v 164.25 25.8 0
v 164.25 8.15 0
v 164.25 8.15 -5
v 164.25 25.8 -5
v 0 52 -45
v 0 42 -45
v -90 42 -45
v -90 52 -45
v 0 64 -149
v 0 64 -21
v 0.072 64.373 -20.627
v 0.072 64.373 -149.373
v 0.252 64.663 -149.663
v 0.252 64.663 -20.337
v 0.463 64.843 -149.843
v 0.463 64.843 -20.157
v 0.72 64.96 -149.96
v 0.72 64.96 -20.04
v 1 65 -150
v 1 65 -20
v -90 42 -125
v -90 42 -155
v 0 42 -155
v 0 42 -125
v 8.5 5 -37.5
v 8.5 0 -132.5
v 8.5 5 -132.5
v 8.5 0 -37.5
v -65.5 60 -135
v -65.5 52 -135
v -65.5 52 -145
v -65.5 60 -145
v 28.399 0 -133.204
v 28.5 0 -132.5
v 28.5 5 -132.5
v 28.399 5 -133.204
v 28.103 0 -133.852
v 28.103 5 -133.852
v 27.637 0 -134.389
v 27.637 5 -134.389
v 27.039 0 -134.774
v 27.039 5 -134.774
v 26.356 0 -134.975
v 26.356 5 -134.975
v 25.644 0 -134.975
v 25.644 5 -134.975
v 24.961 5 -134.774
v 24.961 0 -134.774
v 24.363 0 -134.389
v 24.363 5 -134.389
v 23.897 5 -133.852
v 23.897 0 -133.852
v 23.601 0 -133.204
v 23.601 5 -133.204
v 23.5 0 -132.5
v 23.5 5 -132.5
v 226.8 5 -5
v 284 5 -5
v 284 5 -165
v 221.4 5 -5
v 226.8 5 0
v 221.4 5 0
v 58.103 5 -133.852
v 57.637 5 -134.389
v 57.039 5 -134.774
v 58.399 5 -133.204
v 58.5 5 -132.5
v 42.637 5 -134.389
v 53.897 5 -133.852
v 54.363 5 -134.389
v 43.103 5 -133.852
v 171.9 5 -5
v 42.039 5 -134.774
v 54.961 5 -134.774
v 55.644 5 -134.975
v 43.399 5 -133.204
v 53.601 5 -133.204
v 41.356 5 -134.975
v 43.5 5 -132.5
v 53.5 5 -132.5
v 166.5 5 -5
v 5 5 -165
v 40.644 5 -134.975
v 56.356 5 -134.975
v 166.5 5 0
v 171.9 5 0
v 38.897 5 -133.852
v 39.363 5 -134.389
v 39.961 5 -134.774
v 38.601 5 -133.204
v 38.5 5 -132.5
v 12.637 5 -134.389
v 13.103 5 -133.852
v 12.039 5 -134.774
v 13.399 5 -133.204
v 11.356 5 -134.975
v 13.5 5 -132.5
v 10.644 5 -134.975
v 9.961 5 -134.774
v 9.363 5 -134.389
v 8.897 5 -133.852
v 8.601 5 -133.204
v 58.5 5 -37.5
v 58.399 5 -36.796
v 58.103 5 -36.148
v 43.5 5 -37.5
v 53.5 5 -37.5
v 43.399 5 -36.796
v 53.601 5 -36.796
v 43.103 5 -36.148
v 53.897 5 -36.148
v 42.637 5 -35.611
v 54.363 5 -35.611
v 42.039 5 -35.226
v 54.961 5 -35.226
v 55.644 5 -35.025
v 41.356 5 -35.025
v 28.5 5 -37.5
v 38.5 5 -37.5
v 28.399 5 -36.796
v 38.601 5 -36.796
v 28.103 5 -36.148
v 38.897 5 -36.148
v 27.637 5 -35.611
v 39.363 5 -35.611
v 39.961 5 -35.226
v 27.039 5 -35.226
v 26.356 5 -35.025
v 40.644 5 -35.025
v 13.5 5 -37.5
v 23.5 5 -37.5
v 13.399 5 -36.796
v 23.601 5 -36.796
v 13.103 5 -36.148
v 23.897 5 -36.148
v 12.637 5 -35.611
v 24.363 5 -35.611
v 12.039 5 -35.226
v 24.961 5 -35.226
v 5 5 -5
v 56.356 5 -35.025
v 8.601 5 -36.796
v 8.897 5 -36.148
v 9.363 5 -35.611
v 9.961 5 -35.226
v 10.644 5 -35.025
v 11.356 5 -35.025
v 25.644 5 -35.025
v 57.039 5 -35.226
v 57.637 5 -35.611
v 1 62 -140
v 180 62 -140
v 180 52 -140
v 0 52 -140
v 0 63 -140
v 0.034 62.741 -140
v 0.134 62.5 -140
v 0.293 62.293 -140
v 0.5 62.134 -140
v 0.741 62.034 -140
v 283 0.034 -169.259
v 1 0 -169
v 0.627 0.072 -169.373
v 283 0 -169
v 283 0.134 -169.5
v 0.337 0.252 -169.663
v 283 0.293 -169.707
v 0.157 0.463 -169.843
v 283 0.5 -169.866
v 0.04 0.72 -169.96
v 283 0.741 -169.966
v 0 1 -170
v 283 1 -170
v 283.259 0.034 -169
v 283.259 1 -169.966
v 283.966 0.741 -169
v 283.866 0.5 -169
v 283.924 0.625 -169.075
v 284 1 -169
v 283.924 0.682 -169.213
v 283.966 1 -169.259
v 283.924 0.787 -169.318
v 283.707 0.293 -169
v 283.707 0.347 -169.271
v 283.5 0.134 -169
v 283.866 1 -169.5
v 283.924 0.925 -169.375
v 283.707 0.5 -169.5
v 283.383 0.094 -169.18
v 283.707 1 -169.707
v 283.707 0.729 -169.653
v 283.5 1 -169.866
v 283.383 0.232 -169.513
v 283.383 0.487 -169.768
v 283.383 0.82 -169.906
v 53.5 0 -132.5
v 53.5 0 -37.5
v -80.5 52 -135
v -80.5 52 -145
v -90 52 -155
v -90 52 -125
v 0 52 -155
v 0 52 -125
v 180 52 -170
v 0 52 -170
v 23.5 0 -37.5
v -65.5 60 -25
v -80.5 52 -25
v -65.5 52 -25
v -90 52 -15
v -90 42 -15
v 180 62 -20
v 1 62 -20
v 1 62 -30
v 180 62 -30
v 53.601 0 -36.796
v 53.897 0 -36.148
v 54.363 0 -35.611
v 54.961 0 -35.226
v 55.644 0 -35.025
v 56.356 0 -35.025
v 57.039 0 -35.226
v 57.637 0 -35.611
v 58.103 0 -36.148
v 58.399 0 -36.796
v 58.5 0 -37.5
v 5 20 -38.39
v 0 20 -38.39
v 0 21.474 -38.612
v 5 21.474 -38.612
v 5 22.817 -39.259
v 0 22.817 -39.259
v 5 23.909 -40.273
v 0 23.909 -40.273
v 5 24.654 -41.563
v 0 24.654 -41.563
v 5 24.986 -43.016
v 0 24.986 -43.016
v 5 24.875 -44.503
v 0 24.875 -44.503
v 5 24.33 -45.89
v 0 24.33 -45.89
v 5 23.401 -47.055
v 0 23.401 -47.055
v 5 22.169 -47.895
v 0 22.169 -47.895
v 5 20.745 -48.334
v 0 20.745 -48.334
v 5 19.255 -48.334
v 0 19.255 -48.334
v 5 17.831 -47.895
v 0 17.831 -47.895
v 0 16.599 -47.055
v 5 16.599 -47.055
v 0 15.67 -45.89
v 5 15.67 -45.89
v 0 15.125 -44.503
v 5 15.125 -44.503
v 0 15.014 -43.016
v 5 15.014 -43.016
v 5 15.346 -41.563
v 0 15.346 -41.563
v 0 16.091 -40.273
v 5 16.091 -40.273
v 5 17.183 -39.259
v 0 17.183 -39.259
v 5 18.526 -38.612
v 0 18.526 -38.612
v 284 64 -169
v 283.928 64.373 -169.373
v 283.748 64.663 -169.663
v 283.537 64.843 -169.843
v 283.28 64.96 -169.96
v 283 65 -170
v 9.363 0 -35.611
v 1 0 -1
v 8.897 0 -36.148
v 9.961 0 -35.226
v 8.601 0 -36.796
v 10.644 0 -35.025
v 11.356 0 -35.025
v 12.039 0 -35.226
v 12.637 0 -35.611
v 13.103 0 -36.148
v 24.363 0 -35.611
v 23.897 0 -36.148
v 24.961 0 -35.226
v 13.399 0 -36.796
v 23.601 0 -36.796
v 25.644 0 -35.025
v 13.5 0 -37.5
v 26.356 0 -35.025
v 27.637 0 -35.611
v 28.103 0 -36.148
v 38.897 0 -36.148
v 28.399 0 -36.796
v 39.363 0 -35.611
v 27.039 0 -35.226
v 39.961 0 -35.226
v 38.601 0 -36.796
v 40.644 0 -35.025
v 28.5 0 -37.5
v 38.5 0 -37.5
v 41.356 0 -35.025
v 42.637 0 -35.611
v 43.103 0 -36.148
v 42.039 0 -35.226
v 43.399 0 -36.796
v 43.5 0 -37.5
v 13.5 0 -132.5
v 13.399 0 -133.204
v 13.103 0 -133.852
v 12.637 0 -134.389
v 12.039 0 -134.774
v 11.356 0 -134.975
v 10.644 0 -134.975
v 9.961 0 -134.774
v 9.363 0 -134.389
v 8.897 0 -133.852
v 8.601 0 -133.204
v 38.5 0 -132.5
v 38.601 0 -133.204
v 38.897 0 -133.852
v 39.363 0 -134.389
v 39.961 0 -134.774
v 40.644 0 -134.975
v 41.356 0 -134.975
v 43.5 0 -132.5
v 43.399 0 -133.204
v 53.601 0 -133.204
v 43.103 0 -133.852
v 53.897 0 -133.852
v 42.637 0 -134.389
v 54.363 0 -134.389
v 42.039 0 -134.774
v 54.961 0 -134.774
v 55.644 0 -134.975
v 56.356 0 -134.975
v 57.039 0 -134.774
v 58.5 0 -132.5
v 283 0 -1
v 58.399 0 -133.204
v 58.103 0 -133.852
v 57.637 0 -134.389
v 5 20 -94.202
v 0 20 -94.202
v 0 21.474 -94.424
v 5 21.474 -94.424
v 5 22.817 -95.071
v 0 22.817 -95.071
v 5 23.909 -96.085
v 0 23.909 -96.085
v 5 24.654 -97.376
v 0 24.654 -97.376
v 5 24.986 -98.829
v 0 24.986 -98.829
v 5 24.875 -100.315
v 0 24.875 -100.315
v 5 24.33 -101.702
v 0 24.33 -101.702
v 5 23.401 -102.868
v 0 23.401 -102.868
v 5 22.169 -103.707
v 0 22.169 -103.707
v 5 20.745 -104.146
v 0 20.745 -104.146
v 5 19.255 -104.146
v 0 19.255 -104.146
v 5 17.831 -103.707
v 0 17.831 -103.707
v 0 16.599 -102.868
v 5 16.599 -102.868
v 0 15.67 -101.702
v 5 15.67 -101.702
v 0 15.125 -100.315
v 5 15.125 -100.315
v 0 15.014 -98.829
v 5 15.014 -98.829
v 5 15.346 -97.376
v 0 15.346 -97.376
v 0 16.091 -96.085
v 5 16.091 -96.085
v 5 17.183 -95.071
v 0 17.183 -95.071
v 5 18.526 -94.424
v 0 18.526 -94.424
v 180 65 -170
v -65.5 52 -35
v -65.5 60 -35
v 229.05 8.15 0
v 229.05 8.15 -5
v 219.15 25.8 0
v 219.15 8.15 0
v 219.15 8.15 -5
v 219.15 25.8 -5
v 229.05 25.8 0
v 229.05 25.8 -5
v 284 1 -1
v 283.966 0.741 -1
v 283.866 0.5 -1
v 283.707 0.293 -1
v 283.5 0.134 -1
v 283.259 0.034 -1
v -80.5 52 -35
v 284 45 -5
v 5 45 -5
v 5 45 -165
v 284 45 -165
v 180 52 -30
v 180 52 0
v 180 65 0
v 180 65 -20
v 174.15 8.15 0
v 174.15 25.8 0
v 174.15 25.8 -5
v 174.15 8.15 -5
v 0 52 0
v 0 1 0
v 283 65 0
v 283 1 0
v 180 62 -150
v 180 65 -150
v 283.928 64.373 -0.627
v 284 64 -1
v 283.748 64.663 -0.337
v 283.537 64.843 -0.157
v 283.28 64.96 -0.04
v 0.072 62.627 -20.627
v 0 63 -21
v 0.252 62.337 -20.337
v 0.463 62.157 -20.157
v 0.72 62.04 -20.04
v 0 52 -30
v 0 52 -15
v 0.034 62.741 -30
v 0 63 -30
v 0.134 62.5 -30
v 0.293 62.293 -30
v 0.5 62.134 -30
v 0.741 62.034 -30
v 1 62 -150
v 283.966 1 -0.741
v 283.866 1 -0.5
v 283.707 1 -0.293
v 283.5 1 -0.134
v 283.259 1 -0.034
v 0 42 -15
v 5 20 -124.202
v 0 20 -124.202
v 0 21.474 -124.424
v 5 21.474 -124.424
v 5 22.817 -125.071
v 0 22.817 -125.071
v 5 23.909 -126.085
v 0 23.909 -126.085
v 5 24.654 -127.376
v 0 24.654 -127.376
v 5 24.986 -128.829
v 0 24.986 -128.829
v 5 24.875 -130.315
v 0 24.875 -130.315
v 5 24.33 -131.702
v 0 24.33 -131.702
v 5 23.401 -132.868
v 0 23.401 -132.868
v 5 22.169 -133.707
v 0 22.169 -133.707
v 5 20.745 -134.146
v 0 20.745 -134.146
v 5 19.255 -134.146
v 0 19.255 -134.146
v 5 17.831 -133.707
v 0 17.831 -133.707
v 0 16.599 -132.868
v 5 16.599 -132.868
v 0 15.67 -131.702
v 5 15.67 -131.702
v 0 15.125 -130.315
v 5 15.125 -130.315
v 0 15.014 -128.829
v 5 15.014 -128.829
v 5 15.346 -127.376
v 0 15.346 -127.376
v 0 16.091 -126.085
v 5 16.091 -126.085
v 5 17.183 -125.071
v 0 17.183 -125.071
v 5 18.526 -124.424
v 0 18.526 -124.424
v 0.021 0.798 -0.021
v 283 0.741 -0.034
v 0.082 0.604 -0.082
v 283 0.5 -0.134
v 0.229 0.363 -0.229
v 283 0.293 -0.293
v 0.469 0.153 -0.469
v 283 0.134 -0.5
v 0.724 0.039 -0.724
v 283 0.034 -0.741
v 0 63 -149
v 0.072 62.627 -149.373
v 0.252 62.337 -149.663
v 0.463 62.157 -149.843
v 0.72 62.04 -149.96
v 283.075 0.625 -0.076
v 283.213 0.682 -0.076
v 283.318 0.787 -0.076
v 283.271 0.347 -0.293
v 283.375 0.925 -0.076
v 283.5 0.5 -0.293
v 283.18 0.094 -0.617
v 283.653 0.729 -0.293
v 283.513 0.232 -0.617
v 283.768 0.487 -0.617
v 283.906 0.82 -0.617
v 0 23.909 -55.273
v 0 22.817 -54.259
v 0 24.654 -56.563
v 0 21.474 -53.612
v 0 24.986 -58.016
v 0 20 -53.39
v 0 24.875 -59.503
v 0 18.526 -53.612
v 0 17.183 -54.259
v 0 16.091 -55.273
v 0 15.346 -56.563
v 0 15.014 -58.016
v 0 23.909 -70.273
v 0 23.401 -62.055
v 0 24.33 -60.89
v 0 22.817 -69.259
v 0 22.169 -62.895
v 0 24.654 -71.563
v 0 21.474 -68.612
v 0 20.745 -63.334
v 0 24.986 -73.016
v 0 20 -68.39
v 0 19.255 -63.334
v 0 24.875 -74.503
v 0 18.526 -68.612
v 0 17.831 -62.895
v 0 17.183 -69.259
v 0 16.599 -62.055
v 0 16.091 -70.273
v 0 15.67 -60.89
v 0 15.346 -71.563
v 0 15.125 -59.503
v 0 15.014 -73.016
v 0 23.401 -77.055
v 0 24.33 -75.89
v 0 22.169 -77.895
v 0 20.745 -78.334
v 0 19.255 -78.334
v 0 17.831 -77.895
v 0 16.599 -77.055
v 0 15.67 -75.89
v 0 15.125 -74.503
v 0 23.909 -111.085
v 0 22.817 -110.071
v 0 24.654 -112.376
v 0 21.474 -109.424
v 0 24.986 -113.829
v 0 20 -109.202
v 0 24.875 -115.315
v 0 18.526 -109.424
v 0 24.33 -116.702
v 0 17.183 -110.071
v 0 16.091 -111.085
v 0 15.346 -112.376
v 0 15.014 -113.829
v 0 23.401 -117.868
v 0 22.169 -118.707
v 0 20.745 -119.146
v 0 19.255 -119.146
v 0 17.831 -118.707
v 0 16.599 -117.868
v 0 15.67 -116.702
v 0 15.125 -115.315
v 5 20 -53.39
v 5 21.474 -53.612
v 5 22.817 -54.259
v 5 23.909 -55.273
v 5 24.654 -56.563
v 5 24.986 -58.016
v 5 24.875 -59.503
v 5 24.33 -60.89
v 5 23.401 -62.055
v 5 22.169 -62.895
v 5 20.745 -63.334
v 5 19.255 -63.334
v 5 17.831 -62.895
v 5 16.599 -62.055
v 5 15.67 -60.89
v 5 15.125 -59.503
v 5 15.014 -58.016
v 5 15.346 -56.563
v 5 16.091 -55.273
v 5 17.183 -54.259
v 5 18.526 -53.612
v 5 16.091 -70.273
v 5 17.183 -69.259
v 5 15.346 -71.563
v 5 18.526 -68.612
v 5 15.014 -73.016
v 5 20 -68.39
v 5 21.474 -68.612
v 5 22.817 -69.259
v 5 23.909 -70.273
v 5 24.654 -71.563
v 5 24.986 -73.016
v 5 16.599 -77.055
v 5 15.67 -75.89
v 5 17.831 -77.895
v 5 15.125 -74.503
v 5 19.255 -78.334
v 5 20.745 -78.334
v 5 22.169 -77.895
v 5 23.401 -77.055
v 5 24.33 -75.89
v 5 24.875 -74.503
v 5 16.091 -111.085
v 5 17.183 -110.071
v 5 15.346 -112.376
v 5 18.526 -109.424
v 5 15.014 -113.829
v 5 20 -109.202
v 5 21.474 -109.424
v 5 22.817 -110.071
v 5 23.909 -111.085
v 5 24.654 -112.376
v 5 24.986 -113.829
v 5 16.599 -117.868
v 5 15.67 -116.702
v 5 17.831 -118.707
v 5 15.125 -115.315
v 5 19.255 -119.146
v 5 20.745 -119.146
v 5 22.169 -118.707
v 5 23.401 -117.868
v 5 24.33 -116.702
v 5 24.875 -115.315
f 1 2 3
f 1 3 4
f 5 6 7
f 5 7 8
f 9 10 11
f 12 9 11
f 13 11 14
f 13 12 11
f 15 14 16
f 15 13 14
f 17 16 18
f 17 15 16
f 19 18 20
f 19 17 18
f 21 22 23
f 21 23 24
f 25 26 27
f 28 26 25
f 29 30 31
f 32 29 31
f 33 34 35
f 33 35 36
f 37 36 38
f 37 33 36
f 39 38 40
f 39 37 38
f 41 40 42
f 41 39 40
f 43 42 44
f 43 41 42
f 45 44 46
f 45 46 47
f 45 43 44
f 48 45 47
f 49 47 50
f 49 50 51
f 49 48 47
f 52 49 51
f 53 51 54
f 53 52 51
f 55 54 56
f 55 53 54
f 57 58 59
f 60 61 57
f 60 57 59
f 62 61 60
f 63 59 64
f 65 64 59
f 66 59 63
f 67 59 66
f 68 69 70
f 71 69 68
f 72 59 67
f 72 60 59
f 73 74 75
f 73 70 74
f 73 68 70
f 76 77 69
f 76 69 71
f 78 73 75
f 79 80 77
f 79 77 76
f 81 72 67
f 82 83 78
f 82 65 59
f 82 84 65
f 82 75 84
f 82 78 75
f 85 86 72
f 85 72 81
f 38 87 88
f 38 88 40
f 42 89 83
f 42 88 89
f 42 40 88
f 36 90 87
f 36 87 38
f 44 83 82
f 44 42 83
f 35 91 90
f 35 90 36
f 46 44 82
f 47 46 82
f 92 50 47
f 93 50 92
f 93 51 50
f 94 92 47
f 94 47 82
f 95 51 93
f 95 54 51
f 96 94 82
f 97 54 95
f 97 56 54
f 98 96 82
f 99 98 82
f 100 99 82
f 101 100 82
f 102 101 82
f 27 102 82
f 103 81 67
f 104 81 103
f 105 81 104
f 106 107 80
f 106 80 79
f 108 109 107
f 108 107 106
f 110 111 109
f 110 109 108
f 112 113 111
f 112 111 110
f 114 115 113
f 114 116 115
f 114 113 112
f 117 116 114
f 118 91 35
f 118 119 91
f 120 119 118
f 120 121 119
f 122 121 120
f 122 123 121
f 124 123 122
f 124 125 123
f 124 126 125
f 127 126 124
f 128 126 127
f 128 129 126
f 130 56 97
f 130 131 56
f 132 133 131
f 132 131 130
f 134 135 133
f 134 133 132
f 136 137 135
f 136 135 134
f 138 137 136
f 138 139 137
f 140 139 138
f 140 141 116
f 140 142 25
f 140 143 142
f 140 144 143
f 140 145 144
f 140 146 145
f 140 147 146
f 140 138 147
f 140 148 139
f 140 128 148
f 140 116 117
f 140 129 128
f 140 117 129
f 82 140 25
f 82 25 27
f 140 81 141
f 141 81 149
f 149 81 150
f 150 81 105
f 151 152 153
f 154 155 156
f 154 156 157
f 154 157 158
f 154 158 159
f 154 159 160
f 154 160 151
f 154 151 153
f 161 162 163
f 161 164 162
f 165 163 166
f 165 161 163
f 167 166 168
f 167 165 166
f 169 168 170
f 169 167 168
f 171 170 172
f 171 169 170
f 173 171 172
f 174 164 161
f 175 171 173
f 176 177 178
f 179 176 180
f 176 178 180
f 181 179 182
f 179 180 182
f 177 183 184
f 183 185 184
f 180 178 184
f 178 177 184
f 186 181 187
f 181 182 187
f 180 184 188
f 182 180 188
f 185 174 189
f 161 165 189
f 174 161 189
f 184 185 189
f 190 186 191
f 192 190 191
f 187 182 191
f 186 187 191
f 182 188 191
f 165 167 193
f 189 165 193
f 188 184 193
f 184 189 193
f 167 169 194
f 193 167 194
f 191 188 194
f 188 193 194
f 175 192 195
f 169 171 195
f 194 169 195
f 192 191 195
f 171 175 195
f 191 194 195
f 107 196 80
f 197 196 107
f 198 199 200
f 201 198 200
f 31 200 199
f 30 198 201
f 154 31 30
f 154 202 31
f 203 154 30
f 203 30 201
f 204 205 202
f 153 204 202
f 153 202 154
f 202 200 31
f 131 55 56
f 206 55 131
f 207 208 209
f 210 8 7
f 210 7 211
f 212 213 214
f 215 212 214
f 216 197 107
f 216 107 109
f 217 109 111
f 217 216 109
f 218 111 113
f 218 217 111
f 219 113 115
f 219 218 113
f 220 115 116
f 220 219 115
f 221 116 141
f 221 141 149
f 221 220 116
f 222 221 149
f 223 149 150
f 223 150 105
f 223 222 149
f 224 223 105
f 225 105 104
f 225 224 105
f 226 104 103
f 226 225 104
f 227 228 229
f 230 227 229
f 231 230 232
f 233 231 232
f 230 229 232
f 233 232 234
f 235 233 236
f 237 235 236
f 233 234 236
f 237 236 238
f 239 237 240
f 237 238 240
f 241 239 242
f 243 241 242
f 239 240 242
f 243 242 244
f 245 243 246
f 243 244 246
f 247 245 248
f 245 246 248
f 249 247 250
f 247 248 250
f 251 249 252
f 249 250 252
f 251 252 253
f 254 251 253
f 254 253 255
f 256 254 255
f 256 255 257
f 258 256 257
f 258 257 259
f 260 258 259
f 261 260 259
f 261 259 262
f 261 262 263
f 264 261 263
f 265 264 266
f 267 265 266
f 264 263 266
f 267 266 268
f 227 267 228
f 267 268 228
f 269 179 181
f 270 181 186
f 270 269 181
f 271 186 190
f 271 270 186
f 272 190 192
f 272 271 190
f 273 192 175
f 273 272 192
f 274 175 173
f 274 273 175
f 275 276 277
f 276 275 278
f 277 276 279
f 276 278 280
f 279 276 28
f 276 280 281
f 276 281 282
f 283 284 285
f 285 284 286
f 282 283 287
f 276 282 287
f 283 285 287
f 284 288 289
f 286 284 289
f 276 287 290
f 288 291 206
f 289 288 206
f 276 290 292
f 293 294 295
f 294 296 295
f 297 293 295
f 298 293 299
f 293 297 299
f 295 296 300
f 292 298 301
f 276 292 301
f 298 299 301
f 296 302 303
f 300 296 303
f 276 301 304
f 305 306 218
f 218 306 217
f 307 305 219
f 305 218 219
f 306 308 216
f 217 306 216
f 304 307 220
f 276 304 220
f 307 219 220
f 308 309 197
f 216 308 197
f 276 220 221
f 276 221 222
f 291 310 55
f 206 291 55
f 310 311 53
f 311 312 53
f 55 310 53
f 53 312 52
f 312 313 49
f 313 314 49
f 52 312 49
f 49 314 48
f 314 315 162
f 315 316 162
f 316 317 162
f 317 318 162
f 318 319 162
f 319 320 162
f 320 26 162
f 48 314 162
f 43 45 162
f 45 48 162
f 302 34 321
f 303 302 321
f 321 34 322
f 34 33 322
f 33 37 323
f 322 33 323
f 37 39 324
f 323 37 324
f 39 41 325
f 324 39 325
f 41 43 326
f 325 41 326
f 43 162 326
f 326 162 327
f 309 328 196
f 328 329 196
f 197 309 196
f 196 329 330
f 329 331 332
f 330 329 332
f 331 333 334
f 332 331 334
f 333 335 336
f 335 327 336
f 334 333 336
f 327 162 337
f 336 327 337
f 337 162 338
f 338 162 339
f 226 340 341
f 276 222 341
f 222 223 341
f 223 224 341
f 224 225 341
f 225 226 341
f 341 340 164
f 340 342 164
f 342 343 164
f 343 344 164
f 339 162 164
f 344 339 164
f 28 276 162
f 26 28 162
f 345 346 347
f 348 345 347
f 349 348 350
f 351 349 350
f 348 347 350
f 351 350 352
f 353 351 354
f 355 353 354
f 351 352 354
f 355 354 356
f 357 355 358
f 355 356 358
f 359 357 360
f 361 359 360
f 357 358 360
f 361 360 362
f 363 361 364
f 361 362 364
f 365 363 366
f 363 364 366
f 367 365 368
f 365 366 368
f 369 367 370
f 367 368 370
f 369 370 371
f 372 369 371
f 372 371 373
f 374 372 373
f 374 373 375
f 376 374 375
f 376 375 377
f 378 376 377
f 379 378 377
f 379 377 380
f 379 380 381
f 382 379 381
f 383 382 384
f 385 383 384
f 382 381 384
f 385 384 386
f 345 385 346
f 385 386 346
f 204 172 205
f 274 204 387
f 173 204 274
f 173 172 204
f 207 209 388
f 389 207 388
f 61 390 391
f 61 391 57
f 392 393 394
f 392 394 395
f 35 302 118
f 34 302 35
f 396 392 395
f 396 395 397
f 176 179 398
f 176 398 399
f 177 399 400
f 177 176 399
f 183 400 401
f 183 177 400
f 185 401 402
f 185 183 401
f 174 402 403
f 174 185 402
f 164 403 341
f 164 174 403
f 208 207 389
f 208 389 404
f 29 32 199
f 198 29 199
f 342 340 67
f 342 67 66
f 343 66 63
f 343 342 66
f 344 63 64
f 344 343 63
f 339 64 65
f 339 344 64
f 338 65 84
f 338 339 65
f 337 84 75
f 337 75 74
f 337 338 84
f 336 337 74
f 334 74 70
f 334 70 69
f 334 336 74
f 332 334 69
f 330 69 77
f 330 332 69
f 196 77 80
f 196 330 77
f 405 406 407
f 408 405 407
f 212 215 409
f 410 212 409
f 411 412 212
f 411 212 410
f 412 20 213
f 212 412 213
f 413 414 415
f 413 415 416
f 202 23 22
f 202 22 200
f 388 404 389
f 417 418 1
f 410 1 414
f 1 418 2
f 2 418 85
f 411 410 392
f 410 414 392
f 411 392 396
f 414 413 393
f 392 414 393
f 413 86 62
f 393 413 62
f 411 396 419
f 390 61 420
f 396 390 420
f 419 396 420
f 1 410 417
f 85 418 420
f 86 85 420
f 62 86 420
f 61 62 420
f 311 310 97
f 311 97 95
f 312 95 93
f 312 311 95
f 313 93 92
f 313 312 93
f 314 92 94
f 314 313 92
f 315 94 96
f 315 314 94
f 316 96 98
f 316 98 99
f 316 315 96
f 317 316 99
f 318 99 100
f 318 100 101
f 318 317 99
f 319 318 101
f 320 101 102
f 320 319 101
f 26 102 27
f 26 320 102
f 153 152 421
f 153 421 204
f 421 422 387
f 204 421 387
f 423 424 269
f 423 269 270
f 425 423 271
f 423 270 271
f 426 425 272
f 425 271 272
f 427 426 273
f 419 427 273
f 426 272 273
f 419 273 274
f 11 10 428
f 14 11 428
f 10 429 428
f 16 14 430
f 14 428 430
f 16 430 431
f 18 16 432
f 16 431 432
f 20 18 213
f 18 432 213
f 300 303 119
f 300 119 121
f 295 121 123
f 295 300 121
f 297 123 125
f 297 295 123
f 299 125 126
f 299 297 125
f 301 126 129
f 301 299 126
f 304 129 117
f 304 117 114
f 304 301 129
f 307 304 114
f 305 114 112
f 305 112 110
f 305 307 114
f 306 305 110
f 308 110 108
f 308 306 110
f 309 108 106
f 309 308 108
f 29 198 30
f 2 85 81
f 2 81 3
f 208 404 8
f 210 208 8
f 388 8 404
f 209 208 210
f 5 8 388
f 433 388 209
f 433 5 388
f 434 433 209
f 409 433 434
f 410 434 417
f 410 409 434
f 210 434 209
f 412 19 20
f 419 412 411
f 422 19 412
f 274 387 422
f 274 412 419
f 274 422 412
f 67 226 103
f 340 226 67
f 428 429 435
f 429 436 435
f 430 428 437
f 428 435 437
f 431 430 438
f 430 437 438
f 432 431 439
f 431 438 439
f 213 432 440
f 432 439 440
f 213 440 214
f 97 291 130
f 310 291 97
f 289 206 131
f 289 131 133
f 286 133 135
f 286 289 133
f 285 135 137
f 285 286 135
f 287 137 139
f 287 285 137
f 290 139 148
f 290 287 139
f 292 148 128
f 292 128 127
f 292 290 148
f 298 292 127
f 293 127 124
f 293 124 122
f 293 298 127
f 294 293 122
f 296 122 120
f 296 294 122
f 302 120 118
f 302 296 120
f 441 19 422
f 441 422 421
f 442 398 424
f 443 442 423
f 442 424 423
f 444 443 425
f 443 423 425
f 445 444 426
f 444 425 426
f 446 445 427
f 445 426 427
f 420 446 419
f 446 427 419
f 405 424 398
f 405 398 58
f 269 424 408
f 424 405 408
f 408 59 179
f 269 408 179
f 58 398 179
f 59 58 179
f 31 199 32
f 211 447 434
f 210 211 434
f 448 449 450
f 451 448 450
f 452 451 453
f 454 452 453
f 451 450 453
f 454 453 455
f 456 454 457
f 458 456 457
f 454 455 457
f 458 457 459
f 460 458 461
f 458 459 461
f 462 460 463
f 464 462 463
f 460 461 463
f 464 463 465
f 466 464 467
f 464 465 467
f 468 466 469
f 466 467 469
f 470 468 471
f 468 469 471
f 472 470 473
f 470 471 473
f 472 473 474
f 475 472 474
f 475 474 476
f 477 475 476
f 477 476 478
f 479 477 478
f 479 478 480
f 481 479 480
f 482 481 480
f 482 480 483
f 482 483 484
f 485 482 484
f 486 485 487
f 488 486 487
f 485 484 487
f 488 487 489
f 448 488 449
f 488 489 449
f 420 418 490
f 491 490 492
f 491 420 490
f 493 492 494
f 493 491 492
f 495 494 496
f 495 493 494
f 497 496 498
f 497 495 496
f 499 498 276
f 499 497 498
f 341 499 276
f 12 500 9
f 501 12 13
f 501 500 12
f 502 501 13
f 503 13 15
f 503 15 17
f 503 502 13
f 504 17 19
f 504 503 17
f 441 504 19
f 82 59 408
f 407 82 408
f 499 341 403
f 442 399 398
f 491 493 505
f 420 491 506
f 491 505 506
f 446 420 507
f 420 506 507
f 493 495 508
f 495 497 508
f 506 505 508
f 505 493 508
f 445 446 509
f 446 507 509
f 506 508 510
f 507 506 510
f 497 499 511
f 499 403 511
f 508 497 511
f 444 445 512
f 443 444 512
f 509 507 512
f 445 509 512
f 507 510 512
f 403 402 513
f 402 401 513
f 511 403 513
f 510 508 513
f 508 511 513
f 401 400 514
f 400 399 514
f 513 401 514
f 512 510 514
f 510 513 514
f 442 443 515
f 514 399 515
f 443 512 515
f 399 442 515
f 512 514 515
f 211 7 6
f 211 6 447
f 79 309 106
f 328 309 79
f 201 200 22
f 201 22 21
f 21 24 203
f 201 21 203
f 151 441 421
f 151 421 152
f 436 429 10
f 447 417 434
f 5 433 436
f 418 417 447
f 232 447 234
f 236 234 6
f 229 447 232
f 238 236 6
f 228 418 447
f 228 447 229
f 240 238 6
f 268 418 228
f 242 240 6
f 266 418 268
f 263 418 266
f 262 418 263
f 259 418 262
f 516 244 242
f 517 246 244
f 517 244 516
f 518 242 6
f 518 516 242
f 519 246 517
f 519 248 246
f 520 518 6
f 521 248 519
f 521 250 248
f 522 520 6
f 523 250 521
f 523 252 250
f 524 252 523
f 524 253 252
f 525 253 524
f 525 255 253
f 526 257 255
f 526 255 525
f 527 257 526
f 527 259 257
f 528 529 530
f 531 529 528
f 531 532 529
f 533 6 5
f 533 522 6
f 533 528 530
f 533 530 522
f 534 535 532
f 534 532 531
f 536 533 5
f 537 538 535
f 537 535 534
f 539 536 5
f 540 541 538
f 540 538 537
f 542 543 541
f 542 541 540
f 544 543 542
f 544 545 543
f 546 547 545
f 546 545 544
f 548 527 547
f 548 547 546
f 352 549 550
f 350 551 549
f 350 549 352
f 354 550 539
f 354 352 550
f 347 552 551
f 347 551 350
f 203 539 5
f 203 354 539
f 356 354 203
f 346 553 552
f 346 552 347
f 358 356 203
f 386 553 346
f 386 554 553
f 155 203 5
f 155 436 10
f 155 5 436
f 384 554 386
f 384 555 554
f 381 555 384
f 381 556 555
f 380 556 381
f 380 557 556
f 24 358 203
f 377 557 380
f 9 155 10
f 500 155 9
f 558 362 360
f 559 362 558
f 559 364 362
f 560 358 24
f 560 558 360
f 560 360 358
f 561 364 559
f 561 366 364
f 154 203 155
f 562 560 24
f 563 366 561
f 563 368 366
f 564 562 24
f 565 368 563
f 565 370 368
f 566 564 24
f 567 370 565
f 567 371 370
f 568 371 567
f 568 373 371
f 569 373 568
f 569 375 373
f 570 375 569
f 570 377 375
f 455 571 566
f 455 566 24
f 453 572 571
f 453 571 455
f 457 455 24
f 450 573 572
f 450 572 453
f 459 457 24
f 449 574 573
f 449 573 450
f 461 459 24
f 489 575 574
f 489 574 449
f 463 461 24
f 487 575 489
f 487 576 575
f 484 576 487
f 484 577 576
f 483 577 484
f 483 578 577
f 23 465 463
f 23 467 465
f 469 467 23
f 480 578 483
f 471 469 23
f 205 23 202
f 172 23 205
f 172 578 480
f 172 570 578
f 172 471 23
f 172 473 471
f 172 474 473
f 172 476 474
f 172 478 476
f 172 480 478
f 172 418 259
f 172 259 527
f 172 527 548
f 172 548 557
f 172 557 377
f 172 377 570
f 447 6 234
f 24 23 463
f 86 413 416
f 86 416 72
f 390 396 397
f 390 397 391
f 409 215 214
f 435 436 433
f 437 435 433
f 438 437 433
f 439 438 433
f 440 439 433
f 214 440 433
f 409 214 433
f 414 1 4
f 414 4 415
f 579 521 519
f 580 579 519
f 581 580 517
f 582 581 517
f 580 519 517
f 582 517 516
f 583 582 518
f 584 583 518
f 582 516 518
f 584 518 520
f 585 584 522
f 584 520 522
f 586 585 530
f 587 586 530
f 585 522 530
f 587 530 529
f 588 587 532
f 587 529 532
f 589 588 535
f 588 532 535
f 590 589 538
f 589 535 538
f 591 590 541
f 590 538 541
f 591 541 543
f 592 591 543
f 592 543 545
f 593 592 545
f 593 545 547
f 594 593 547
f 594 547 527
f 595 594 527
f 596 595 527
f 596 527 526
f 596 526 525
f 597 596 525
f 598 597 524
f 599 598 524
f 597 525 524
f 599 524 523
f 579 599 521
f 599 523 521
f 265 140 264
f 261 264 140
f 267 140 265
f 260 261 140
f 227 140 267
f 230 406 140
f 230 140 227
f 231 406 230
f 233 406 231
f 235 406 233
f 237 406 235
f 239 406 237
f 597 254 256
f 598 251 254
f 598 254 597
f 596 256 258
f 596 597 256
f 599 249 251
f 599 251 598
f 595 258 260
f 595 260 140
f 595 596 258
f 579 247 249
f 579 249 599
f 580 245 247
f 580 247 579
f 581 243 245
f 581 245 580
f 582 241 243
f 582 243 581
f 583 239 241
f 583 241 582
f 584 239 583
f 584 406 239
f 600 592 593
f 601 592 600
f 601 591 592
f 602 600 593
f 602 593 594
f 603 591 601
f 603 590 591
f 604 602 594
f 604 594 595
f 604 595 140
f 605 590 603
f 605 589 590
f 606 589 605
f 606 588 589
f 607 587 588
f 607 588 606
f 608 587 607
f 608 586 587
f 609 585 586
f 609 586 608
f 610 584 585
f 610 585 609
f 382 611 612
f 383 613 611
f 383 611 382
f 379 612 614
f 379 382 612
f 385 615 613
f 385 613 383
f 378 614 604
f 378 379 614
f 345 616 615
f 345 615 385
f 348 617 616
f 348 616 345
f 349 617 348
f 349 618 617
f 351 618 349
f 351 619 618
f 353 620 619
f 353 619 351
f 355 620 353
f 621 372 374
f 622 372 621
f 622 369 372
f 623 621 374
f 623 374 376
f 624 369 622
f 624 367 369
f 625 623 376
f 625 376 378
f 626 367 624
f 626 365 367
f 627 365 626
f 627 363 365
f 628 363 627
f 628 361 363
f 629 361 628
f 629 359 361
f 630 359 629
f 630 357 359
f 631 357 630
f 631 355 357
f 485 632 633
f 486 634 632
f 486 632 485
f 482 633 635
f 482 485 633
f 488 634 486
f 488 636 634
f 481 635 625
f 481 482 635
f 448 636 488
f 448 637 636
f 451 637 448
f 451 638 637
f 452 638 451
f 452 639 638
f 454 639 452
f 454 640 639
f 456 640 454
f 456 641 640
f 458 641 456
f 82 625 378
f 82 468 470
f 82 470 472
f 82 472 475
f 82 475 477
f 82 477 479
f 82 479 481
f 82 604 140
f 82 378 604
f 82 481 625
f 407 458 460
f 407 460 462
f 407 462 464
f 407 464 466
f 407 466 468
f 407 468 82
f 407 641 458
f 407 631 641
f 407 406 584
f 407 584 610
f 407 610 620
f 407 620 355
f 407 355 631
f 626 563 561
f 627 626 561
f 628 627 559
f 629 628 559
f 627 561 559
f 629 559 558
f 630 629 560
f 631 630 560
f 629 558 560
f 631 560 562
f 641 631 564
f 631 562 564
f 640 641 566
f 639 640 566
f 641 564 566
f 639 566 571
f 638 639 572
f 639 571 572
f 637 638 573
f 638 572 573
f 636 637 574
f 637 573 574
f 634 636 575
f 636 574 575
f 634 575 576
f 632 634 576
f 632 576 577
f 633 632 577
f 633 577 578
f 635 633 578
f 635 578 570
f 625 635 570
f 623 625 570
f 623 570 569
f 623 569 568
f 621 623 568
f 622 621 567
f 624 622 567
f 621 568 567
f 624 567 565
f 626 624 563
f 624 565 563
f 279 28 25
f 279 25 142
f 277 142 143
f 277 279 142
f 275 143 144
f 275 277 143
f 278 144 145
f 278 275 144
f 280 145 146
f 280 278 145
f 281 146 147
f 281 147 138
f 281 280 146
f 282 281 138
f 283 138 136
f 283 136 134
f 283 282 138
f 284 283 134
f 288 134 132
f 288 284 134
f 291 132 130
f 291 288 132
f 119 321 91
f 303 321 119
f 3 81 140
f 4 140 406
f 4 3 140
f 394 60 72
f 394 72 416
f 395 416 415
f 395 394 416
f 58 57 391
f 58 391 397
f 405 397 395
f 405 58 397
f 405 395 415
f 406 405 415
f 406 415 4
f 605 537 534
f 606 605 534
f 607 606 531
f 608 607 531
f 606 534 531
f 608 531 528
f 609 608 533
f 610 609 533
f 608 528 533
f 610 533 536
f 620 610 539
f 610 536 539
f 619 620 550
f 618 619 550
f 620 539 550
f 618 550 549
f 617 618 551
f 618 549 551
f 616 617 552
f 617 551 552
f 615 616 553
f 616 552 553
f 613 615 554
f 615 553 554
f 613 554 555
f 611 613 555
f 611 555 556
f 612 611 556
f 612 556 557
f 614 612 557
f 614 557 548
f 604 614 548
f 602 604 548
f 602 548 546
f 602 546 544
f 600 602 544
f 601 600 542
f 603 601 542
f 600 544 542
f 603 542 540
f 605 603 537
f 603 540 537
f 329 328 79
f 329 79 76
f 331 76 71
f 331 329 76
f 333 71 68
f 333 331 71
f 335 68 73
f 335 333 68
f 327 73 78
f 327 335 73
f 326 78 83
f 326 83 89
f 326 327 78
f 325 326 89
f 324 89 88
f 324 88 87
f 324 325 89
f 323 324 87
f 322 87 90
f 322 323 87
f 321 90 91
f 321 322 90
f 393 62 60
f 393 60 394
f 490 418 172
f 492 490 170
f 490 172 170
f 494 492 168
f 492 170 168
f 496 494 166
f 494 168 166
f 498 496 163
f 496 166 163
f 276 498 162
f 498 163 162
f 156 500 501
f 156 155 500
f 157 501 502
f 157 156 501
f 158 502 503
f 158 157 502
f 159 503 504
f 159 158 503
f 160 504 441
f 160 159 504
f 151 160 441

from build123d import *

# Parameters (mm, degrees)
SKETCH1_W           = 284
SKETCH1_H           = 170
BOSS_EXTRUDE1_DEPTH = 65
CUT_EXTRUDE1_DEPTH  = 180
SKETCH3_W           = 30
SKETCH3_H           = 10
BOSS_EXTRUDE2_DEPTH = 90
SKETCH4_W           = 15
SKETCH4_H           = 10
BOSS_EXTRUDE3_DEPTH = 8
CUT_EXTRUDE2_DEPTH  = 10
CUT_EXTRUDE3_DEPTH  = 10
CUT_EXTRUDE4_DEPTH  = 5
SKETCH8_W           = 160
SKETCH8_H           = 40
CUT_EXTRUDE5_DEPTH  = 279
CUT_EXTRUDE6_DEPTH  = 5
SKETCH10_R          = 5
CUT_EXTRUDE7_DEPTH  = 5
FILLET1_R           = 1
FILLET2_R           = 1


with BuildPart() as part:
    # Sketch1 → Boss-Extrude1 (new body)
    with BuildSketch(Plane(origin=(0, 0, 0), x_dir=(1, 0, 0), z_dir=(0, 1, 0))):
        with Locations((142, 85)):
            Rectangle(SKETCH1_W, SKETCH1_H)
    extrude(amount=BOSS_EXTRUDE1_DEPTH)

    # Sketch2 → Cut-Extrude1 (cut)
    with BuildSketch(Plane.ZY):
        Polygon((-140, 52), (-170, 52), (-170, 65), (-150, 65), (-150, 62), (-140, 62), align=None)
        Polygon((-30, 52), (0, 52), (0, 65), (-20, 65), (-20, 62), (-30, 62), align=None)
    extrude(amount=-CUT_EXTRUDE1_DEPTH, mode=Mode.SUBTRACT)

    # Sketch3 → Boss-Extrude2 (add)
    with BuildSketch(Plane.ZY):
        with Locations((-140, 47)):
            Rectangle(SKETCH3_W, SKETCH3_H)
        with Locations((-30, 47)):
            Rectangle(SKETCH3_W, SKETCH3_H)
    extrude(amount=BOSS_EXTRUDE2_DEPTH)

    # Sketch4 → Boss-Extrude3 (add)
    with BuildSketch(Plane(origin=(0, 52, 0), x_dir=(1, 0, 0), z_dir=(0, 1, 0))):
        with Locations((-73, 140)):
            Rectangle(SKETCH4_W, SKETCH4_H)
        with Locations((-73, 30)):
            Rectangle(SKETCH4_W, SKETCH4_H)
    extrude(amount=BOSS_EXTRUDE3_DEPTH)

    # Sketch6 → Cut-Extrude2 (cut)
    with BuildSketch(Plane(origin=(0, 0, -145), x_dir=(-1, 0, 0), z_dir=(0, 0, -1))):
        Polygon((65.5, 60), (80.5, 52), (80.5, 60), align=None)
    extrude(amount=-CUT_EXTRUDE2_DEPTH, mode=Mode.SUBTRACT)

    # Sketch5 → Cut-Extrude3 (cut)
    with BuildSketch(Plane.XY.offset(-25)):
        Polygon((-65.5, 60), (-80.5, 52), (-80.5, 60), align=None)
    extrude(amount=-CUT_EXTRUDE3_DEPTH, mode=Mode.SUBTRACT)

    # Sketch7 → Cut-Extrude4 (cut)
    with BuildSketch(Plane.XZ):
        with BuildLine():
            Line((13.5, -37.5), (13.5, -132.5))
            ThreePointArc((13.5, -132.5), (11, -135), (8.5, -132.5))
            Line((8.5, -132.5), (8.5, -37.5))
            ThreePointArc((8.5, -37.5), (11, -35), (13.5, -37.5))
        make_face()
        with BuildLine():
            Line((58.5, -37.5), (58.5, -132.5))
            ThreePointArc((58.5, -132.5), (56, -135), (53.5, -132.5))
            Line((53.5, -132.5), (53.5, -37.5))
            ThreePointArc((53.5, -37.5), (56, -35), (58.5, -37.5))
        make_face()
        with BuildLine():
            Line((28.5, -37.5), (28.5, -132.5))
            ThreePointArc((28.5, -132.5), (26, -135), (23.5, -132.5))
            Line((23.5, -132.5), (23.5, -37.5))
            ThreePointArc((23.5, -37.5), (26, -35), (28.5, -37.5))
        make_face()
        with BuildLine():
            Line((43.5, -37.5), (43.5, -132.5))
            ThreePointArc((43.5, -132.5), (41, -135), (38.5, -132.5))
            Line((38.5, -132.5), (38.5, -37.5))
            ThreePointArc((38.5, -37.5), (41, -35), (43.5, -37.5))
        make_face()
    extrude(amount=-CUT_EXTRUDE4_DEPTH, mode=Mode.SUBTRACT)

    # Sketch8 → Cut-Extrude5 (cut)
    with BuildSketch(Plane(origin=(284, 0, 0), x_dir=(0, 0, -1), z_dir=(1, 0, 0))):
        with Locations((85, 25)):
            Rectangle(SKETCH8_W, SKETCH8_H)
    extrude(amount=-CUT_EXTRUDE5_DEPTH, mode=Mode.SUBTRACT)

    # Sketch9 → Cut-Extrude6 (cut)
    with BuildSketch(Plane.XY):
        Polygon((219.15, 25.8), (229.05, 25.8), (229.05, 8.15), (226.8, 5), (221.4, 5), (219.15, 8.15), align=None)
        Polygon((164.25, 25.8), (174.15, 25.8), (174.15, 8.15), (171.9, 5), (166.5, 5), (164.25, 8.15), align=None)
    extrude(amount=-CUT_EXTRUDE6_DEPTH, mode=Mode.SUBTRACT)

    # Sketch10 → Cut-Extrude7 (cut)
    with BuildSketch(Plane.ZY):
        with Locations((-129.202249563, 20)):
            Circle(SKETCH10_R)
        with Locations((-114.202249563, 20)):
            Circle(SKETCH10_R)
        with Locations((-99.202249563, 20)):
            Circle(SKETCH10_R)
        with Locations((-43.390057257, 20)):
            Circle(SKETCH10_R)
        with Locations((-58.390057257, 20)):
            Circle(SKETCH10_R)
        with Locations((-73.390057257, 20)):
            Circle(SKETCH10_R)
    extrude(amount=-CUT_EXTRUDE7_DEPTH, mode=Mode.SUBTRACT)

    # Fillet1
    fillet1_edges = [part.edges().sort_by_distance(p)[0] for p in [
        (0, 65, -85),
        (0, 63.5, -150),
        (0, 62, -145),
        (0, 62, -25),
        (0, 63.5, -20),
    ]]
    fillet(fillet1_edges, radius=FILLET1_R)

    # Fillet2
    fillet2_edges = [part.edges().sort_by_distance(p)[0] for p in [
        (284, 65, -85),
        (142, 0, -170),
        (284, 0, -85),
        (142, 0, 0),
        (0, 0, -85),
        (284, 32.5, -170),
        (284, 32.5, 0),
    ]]
    fillet(fillet2_edges, radius=FILLET2_R)


solid = part.part
